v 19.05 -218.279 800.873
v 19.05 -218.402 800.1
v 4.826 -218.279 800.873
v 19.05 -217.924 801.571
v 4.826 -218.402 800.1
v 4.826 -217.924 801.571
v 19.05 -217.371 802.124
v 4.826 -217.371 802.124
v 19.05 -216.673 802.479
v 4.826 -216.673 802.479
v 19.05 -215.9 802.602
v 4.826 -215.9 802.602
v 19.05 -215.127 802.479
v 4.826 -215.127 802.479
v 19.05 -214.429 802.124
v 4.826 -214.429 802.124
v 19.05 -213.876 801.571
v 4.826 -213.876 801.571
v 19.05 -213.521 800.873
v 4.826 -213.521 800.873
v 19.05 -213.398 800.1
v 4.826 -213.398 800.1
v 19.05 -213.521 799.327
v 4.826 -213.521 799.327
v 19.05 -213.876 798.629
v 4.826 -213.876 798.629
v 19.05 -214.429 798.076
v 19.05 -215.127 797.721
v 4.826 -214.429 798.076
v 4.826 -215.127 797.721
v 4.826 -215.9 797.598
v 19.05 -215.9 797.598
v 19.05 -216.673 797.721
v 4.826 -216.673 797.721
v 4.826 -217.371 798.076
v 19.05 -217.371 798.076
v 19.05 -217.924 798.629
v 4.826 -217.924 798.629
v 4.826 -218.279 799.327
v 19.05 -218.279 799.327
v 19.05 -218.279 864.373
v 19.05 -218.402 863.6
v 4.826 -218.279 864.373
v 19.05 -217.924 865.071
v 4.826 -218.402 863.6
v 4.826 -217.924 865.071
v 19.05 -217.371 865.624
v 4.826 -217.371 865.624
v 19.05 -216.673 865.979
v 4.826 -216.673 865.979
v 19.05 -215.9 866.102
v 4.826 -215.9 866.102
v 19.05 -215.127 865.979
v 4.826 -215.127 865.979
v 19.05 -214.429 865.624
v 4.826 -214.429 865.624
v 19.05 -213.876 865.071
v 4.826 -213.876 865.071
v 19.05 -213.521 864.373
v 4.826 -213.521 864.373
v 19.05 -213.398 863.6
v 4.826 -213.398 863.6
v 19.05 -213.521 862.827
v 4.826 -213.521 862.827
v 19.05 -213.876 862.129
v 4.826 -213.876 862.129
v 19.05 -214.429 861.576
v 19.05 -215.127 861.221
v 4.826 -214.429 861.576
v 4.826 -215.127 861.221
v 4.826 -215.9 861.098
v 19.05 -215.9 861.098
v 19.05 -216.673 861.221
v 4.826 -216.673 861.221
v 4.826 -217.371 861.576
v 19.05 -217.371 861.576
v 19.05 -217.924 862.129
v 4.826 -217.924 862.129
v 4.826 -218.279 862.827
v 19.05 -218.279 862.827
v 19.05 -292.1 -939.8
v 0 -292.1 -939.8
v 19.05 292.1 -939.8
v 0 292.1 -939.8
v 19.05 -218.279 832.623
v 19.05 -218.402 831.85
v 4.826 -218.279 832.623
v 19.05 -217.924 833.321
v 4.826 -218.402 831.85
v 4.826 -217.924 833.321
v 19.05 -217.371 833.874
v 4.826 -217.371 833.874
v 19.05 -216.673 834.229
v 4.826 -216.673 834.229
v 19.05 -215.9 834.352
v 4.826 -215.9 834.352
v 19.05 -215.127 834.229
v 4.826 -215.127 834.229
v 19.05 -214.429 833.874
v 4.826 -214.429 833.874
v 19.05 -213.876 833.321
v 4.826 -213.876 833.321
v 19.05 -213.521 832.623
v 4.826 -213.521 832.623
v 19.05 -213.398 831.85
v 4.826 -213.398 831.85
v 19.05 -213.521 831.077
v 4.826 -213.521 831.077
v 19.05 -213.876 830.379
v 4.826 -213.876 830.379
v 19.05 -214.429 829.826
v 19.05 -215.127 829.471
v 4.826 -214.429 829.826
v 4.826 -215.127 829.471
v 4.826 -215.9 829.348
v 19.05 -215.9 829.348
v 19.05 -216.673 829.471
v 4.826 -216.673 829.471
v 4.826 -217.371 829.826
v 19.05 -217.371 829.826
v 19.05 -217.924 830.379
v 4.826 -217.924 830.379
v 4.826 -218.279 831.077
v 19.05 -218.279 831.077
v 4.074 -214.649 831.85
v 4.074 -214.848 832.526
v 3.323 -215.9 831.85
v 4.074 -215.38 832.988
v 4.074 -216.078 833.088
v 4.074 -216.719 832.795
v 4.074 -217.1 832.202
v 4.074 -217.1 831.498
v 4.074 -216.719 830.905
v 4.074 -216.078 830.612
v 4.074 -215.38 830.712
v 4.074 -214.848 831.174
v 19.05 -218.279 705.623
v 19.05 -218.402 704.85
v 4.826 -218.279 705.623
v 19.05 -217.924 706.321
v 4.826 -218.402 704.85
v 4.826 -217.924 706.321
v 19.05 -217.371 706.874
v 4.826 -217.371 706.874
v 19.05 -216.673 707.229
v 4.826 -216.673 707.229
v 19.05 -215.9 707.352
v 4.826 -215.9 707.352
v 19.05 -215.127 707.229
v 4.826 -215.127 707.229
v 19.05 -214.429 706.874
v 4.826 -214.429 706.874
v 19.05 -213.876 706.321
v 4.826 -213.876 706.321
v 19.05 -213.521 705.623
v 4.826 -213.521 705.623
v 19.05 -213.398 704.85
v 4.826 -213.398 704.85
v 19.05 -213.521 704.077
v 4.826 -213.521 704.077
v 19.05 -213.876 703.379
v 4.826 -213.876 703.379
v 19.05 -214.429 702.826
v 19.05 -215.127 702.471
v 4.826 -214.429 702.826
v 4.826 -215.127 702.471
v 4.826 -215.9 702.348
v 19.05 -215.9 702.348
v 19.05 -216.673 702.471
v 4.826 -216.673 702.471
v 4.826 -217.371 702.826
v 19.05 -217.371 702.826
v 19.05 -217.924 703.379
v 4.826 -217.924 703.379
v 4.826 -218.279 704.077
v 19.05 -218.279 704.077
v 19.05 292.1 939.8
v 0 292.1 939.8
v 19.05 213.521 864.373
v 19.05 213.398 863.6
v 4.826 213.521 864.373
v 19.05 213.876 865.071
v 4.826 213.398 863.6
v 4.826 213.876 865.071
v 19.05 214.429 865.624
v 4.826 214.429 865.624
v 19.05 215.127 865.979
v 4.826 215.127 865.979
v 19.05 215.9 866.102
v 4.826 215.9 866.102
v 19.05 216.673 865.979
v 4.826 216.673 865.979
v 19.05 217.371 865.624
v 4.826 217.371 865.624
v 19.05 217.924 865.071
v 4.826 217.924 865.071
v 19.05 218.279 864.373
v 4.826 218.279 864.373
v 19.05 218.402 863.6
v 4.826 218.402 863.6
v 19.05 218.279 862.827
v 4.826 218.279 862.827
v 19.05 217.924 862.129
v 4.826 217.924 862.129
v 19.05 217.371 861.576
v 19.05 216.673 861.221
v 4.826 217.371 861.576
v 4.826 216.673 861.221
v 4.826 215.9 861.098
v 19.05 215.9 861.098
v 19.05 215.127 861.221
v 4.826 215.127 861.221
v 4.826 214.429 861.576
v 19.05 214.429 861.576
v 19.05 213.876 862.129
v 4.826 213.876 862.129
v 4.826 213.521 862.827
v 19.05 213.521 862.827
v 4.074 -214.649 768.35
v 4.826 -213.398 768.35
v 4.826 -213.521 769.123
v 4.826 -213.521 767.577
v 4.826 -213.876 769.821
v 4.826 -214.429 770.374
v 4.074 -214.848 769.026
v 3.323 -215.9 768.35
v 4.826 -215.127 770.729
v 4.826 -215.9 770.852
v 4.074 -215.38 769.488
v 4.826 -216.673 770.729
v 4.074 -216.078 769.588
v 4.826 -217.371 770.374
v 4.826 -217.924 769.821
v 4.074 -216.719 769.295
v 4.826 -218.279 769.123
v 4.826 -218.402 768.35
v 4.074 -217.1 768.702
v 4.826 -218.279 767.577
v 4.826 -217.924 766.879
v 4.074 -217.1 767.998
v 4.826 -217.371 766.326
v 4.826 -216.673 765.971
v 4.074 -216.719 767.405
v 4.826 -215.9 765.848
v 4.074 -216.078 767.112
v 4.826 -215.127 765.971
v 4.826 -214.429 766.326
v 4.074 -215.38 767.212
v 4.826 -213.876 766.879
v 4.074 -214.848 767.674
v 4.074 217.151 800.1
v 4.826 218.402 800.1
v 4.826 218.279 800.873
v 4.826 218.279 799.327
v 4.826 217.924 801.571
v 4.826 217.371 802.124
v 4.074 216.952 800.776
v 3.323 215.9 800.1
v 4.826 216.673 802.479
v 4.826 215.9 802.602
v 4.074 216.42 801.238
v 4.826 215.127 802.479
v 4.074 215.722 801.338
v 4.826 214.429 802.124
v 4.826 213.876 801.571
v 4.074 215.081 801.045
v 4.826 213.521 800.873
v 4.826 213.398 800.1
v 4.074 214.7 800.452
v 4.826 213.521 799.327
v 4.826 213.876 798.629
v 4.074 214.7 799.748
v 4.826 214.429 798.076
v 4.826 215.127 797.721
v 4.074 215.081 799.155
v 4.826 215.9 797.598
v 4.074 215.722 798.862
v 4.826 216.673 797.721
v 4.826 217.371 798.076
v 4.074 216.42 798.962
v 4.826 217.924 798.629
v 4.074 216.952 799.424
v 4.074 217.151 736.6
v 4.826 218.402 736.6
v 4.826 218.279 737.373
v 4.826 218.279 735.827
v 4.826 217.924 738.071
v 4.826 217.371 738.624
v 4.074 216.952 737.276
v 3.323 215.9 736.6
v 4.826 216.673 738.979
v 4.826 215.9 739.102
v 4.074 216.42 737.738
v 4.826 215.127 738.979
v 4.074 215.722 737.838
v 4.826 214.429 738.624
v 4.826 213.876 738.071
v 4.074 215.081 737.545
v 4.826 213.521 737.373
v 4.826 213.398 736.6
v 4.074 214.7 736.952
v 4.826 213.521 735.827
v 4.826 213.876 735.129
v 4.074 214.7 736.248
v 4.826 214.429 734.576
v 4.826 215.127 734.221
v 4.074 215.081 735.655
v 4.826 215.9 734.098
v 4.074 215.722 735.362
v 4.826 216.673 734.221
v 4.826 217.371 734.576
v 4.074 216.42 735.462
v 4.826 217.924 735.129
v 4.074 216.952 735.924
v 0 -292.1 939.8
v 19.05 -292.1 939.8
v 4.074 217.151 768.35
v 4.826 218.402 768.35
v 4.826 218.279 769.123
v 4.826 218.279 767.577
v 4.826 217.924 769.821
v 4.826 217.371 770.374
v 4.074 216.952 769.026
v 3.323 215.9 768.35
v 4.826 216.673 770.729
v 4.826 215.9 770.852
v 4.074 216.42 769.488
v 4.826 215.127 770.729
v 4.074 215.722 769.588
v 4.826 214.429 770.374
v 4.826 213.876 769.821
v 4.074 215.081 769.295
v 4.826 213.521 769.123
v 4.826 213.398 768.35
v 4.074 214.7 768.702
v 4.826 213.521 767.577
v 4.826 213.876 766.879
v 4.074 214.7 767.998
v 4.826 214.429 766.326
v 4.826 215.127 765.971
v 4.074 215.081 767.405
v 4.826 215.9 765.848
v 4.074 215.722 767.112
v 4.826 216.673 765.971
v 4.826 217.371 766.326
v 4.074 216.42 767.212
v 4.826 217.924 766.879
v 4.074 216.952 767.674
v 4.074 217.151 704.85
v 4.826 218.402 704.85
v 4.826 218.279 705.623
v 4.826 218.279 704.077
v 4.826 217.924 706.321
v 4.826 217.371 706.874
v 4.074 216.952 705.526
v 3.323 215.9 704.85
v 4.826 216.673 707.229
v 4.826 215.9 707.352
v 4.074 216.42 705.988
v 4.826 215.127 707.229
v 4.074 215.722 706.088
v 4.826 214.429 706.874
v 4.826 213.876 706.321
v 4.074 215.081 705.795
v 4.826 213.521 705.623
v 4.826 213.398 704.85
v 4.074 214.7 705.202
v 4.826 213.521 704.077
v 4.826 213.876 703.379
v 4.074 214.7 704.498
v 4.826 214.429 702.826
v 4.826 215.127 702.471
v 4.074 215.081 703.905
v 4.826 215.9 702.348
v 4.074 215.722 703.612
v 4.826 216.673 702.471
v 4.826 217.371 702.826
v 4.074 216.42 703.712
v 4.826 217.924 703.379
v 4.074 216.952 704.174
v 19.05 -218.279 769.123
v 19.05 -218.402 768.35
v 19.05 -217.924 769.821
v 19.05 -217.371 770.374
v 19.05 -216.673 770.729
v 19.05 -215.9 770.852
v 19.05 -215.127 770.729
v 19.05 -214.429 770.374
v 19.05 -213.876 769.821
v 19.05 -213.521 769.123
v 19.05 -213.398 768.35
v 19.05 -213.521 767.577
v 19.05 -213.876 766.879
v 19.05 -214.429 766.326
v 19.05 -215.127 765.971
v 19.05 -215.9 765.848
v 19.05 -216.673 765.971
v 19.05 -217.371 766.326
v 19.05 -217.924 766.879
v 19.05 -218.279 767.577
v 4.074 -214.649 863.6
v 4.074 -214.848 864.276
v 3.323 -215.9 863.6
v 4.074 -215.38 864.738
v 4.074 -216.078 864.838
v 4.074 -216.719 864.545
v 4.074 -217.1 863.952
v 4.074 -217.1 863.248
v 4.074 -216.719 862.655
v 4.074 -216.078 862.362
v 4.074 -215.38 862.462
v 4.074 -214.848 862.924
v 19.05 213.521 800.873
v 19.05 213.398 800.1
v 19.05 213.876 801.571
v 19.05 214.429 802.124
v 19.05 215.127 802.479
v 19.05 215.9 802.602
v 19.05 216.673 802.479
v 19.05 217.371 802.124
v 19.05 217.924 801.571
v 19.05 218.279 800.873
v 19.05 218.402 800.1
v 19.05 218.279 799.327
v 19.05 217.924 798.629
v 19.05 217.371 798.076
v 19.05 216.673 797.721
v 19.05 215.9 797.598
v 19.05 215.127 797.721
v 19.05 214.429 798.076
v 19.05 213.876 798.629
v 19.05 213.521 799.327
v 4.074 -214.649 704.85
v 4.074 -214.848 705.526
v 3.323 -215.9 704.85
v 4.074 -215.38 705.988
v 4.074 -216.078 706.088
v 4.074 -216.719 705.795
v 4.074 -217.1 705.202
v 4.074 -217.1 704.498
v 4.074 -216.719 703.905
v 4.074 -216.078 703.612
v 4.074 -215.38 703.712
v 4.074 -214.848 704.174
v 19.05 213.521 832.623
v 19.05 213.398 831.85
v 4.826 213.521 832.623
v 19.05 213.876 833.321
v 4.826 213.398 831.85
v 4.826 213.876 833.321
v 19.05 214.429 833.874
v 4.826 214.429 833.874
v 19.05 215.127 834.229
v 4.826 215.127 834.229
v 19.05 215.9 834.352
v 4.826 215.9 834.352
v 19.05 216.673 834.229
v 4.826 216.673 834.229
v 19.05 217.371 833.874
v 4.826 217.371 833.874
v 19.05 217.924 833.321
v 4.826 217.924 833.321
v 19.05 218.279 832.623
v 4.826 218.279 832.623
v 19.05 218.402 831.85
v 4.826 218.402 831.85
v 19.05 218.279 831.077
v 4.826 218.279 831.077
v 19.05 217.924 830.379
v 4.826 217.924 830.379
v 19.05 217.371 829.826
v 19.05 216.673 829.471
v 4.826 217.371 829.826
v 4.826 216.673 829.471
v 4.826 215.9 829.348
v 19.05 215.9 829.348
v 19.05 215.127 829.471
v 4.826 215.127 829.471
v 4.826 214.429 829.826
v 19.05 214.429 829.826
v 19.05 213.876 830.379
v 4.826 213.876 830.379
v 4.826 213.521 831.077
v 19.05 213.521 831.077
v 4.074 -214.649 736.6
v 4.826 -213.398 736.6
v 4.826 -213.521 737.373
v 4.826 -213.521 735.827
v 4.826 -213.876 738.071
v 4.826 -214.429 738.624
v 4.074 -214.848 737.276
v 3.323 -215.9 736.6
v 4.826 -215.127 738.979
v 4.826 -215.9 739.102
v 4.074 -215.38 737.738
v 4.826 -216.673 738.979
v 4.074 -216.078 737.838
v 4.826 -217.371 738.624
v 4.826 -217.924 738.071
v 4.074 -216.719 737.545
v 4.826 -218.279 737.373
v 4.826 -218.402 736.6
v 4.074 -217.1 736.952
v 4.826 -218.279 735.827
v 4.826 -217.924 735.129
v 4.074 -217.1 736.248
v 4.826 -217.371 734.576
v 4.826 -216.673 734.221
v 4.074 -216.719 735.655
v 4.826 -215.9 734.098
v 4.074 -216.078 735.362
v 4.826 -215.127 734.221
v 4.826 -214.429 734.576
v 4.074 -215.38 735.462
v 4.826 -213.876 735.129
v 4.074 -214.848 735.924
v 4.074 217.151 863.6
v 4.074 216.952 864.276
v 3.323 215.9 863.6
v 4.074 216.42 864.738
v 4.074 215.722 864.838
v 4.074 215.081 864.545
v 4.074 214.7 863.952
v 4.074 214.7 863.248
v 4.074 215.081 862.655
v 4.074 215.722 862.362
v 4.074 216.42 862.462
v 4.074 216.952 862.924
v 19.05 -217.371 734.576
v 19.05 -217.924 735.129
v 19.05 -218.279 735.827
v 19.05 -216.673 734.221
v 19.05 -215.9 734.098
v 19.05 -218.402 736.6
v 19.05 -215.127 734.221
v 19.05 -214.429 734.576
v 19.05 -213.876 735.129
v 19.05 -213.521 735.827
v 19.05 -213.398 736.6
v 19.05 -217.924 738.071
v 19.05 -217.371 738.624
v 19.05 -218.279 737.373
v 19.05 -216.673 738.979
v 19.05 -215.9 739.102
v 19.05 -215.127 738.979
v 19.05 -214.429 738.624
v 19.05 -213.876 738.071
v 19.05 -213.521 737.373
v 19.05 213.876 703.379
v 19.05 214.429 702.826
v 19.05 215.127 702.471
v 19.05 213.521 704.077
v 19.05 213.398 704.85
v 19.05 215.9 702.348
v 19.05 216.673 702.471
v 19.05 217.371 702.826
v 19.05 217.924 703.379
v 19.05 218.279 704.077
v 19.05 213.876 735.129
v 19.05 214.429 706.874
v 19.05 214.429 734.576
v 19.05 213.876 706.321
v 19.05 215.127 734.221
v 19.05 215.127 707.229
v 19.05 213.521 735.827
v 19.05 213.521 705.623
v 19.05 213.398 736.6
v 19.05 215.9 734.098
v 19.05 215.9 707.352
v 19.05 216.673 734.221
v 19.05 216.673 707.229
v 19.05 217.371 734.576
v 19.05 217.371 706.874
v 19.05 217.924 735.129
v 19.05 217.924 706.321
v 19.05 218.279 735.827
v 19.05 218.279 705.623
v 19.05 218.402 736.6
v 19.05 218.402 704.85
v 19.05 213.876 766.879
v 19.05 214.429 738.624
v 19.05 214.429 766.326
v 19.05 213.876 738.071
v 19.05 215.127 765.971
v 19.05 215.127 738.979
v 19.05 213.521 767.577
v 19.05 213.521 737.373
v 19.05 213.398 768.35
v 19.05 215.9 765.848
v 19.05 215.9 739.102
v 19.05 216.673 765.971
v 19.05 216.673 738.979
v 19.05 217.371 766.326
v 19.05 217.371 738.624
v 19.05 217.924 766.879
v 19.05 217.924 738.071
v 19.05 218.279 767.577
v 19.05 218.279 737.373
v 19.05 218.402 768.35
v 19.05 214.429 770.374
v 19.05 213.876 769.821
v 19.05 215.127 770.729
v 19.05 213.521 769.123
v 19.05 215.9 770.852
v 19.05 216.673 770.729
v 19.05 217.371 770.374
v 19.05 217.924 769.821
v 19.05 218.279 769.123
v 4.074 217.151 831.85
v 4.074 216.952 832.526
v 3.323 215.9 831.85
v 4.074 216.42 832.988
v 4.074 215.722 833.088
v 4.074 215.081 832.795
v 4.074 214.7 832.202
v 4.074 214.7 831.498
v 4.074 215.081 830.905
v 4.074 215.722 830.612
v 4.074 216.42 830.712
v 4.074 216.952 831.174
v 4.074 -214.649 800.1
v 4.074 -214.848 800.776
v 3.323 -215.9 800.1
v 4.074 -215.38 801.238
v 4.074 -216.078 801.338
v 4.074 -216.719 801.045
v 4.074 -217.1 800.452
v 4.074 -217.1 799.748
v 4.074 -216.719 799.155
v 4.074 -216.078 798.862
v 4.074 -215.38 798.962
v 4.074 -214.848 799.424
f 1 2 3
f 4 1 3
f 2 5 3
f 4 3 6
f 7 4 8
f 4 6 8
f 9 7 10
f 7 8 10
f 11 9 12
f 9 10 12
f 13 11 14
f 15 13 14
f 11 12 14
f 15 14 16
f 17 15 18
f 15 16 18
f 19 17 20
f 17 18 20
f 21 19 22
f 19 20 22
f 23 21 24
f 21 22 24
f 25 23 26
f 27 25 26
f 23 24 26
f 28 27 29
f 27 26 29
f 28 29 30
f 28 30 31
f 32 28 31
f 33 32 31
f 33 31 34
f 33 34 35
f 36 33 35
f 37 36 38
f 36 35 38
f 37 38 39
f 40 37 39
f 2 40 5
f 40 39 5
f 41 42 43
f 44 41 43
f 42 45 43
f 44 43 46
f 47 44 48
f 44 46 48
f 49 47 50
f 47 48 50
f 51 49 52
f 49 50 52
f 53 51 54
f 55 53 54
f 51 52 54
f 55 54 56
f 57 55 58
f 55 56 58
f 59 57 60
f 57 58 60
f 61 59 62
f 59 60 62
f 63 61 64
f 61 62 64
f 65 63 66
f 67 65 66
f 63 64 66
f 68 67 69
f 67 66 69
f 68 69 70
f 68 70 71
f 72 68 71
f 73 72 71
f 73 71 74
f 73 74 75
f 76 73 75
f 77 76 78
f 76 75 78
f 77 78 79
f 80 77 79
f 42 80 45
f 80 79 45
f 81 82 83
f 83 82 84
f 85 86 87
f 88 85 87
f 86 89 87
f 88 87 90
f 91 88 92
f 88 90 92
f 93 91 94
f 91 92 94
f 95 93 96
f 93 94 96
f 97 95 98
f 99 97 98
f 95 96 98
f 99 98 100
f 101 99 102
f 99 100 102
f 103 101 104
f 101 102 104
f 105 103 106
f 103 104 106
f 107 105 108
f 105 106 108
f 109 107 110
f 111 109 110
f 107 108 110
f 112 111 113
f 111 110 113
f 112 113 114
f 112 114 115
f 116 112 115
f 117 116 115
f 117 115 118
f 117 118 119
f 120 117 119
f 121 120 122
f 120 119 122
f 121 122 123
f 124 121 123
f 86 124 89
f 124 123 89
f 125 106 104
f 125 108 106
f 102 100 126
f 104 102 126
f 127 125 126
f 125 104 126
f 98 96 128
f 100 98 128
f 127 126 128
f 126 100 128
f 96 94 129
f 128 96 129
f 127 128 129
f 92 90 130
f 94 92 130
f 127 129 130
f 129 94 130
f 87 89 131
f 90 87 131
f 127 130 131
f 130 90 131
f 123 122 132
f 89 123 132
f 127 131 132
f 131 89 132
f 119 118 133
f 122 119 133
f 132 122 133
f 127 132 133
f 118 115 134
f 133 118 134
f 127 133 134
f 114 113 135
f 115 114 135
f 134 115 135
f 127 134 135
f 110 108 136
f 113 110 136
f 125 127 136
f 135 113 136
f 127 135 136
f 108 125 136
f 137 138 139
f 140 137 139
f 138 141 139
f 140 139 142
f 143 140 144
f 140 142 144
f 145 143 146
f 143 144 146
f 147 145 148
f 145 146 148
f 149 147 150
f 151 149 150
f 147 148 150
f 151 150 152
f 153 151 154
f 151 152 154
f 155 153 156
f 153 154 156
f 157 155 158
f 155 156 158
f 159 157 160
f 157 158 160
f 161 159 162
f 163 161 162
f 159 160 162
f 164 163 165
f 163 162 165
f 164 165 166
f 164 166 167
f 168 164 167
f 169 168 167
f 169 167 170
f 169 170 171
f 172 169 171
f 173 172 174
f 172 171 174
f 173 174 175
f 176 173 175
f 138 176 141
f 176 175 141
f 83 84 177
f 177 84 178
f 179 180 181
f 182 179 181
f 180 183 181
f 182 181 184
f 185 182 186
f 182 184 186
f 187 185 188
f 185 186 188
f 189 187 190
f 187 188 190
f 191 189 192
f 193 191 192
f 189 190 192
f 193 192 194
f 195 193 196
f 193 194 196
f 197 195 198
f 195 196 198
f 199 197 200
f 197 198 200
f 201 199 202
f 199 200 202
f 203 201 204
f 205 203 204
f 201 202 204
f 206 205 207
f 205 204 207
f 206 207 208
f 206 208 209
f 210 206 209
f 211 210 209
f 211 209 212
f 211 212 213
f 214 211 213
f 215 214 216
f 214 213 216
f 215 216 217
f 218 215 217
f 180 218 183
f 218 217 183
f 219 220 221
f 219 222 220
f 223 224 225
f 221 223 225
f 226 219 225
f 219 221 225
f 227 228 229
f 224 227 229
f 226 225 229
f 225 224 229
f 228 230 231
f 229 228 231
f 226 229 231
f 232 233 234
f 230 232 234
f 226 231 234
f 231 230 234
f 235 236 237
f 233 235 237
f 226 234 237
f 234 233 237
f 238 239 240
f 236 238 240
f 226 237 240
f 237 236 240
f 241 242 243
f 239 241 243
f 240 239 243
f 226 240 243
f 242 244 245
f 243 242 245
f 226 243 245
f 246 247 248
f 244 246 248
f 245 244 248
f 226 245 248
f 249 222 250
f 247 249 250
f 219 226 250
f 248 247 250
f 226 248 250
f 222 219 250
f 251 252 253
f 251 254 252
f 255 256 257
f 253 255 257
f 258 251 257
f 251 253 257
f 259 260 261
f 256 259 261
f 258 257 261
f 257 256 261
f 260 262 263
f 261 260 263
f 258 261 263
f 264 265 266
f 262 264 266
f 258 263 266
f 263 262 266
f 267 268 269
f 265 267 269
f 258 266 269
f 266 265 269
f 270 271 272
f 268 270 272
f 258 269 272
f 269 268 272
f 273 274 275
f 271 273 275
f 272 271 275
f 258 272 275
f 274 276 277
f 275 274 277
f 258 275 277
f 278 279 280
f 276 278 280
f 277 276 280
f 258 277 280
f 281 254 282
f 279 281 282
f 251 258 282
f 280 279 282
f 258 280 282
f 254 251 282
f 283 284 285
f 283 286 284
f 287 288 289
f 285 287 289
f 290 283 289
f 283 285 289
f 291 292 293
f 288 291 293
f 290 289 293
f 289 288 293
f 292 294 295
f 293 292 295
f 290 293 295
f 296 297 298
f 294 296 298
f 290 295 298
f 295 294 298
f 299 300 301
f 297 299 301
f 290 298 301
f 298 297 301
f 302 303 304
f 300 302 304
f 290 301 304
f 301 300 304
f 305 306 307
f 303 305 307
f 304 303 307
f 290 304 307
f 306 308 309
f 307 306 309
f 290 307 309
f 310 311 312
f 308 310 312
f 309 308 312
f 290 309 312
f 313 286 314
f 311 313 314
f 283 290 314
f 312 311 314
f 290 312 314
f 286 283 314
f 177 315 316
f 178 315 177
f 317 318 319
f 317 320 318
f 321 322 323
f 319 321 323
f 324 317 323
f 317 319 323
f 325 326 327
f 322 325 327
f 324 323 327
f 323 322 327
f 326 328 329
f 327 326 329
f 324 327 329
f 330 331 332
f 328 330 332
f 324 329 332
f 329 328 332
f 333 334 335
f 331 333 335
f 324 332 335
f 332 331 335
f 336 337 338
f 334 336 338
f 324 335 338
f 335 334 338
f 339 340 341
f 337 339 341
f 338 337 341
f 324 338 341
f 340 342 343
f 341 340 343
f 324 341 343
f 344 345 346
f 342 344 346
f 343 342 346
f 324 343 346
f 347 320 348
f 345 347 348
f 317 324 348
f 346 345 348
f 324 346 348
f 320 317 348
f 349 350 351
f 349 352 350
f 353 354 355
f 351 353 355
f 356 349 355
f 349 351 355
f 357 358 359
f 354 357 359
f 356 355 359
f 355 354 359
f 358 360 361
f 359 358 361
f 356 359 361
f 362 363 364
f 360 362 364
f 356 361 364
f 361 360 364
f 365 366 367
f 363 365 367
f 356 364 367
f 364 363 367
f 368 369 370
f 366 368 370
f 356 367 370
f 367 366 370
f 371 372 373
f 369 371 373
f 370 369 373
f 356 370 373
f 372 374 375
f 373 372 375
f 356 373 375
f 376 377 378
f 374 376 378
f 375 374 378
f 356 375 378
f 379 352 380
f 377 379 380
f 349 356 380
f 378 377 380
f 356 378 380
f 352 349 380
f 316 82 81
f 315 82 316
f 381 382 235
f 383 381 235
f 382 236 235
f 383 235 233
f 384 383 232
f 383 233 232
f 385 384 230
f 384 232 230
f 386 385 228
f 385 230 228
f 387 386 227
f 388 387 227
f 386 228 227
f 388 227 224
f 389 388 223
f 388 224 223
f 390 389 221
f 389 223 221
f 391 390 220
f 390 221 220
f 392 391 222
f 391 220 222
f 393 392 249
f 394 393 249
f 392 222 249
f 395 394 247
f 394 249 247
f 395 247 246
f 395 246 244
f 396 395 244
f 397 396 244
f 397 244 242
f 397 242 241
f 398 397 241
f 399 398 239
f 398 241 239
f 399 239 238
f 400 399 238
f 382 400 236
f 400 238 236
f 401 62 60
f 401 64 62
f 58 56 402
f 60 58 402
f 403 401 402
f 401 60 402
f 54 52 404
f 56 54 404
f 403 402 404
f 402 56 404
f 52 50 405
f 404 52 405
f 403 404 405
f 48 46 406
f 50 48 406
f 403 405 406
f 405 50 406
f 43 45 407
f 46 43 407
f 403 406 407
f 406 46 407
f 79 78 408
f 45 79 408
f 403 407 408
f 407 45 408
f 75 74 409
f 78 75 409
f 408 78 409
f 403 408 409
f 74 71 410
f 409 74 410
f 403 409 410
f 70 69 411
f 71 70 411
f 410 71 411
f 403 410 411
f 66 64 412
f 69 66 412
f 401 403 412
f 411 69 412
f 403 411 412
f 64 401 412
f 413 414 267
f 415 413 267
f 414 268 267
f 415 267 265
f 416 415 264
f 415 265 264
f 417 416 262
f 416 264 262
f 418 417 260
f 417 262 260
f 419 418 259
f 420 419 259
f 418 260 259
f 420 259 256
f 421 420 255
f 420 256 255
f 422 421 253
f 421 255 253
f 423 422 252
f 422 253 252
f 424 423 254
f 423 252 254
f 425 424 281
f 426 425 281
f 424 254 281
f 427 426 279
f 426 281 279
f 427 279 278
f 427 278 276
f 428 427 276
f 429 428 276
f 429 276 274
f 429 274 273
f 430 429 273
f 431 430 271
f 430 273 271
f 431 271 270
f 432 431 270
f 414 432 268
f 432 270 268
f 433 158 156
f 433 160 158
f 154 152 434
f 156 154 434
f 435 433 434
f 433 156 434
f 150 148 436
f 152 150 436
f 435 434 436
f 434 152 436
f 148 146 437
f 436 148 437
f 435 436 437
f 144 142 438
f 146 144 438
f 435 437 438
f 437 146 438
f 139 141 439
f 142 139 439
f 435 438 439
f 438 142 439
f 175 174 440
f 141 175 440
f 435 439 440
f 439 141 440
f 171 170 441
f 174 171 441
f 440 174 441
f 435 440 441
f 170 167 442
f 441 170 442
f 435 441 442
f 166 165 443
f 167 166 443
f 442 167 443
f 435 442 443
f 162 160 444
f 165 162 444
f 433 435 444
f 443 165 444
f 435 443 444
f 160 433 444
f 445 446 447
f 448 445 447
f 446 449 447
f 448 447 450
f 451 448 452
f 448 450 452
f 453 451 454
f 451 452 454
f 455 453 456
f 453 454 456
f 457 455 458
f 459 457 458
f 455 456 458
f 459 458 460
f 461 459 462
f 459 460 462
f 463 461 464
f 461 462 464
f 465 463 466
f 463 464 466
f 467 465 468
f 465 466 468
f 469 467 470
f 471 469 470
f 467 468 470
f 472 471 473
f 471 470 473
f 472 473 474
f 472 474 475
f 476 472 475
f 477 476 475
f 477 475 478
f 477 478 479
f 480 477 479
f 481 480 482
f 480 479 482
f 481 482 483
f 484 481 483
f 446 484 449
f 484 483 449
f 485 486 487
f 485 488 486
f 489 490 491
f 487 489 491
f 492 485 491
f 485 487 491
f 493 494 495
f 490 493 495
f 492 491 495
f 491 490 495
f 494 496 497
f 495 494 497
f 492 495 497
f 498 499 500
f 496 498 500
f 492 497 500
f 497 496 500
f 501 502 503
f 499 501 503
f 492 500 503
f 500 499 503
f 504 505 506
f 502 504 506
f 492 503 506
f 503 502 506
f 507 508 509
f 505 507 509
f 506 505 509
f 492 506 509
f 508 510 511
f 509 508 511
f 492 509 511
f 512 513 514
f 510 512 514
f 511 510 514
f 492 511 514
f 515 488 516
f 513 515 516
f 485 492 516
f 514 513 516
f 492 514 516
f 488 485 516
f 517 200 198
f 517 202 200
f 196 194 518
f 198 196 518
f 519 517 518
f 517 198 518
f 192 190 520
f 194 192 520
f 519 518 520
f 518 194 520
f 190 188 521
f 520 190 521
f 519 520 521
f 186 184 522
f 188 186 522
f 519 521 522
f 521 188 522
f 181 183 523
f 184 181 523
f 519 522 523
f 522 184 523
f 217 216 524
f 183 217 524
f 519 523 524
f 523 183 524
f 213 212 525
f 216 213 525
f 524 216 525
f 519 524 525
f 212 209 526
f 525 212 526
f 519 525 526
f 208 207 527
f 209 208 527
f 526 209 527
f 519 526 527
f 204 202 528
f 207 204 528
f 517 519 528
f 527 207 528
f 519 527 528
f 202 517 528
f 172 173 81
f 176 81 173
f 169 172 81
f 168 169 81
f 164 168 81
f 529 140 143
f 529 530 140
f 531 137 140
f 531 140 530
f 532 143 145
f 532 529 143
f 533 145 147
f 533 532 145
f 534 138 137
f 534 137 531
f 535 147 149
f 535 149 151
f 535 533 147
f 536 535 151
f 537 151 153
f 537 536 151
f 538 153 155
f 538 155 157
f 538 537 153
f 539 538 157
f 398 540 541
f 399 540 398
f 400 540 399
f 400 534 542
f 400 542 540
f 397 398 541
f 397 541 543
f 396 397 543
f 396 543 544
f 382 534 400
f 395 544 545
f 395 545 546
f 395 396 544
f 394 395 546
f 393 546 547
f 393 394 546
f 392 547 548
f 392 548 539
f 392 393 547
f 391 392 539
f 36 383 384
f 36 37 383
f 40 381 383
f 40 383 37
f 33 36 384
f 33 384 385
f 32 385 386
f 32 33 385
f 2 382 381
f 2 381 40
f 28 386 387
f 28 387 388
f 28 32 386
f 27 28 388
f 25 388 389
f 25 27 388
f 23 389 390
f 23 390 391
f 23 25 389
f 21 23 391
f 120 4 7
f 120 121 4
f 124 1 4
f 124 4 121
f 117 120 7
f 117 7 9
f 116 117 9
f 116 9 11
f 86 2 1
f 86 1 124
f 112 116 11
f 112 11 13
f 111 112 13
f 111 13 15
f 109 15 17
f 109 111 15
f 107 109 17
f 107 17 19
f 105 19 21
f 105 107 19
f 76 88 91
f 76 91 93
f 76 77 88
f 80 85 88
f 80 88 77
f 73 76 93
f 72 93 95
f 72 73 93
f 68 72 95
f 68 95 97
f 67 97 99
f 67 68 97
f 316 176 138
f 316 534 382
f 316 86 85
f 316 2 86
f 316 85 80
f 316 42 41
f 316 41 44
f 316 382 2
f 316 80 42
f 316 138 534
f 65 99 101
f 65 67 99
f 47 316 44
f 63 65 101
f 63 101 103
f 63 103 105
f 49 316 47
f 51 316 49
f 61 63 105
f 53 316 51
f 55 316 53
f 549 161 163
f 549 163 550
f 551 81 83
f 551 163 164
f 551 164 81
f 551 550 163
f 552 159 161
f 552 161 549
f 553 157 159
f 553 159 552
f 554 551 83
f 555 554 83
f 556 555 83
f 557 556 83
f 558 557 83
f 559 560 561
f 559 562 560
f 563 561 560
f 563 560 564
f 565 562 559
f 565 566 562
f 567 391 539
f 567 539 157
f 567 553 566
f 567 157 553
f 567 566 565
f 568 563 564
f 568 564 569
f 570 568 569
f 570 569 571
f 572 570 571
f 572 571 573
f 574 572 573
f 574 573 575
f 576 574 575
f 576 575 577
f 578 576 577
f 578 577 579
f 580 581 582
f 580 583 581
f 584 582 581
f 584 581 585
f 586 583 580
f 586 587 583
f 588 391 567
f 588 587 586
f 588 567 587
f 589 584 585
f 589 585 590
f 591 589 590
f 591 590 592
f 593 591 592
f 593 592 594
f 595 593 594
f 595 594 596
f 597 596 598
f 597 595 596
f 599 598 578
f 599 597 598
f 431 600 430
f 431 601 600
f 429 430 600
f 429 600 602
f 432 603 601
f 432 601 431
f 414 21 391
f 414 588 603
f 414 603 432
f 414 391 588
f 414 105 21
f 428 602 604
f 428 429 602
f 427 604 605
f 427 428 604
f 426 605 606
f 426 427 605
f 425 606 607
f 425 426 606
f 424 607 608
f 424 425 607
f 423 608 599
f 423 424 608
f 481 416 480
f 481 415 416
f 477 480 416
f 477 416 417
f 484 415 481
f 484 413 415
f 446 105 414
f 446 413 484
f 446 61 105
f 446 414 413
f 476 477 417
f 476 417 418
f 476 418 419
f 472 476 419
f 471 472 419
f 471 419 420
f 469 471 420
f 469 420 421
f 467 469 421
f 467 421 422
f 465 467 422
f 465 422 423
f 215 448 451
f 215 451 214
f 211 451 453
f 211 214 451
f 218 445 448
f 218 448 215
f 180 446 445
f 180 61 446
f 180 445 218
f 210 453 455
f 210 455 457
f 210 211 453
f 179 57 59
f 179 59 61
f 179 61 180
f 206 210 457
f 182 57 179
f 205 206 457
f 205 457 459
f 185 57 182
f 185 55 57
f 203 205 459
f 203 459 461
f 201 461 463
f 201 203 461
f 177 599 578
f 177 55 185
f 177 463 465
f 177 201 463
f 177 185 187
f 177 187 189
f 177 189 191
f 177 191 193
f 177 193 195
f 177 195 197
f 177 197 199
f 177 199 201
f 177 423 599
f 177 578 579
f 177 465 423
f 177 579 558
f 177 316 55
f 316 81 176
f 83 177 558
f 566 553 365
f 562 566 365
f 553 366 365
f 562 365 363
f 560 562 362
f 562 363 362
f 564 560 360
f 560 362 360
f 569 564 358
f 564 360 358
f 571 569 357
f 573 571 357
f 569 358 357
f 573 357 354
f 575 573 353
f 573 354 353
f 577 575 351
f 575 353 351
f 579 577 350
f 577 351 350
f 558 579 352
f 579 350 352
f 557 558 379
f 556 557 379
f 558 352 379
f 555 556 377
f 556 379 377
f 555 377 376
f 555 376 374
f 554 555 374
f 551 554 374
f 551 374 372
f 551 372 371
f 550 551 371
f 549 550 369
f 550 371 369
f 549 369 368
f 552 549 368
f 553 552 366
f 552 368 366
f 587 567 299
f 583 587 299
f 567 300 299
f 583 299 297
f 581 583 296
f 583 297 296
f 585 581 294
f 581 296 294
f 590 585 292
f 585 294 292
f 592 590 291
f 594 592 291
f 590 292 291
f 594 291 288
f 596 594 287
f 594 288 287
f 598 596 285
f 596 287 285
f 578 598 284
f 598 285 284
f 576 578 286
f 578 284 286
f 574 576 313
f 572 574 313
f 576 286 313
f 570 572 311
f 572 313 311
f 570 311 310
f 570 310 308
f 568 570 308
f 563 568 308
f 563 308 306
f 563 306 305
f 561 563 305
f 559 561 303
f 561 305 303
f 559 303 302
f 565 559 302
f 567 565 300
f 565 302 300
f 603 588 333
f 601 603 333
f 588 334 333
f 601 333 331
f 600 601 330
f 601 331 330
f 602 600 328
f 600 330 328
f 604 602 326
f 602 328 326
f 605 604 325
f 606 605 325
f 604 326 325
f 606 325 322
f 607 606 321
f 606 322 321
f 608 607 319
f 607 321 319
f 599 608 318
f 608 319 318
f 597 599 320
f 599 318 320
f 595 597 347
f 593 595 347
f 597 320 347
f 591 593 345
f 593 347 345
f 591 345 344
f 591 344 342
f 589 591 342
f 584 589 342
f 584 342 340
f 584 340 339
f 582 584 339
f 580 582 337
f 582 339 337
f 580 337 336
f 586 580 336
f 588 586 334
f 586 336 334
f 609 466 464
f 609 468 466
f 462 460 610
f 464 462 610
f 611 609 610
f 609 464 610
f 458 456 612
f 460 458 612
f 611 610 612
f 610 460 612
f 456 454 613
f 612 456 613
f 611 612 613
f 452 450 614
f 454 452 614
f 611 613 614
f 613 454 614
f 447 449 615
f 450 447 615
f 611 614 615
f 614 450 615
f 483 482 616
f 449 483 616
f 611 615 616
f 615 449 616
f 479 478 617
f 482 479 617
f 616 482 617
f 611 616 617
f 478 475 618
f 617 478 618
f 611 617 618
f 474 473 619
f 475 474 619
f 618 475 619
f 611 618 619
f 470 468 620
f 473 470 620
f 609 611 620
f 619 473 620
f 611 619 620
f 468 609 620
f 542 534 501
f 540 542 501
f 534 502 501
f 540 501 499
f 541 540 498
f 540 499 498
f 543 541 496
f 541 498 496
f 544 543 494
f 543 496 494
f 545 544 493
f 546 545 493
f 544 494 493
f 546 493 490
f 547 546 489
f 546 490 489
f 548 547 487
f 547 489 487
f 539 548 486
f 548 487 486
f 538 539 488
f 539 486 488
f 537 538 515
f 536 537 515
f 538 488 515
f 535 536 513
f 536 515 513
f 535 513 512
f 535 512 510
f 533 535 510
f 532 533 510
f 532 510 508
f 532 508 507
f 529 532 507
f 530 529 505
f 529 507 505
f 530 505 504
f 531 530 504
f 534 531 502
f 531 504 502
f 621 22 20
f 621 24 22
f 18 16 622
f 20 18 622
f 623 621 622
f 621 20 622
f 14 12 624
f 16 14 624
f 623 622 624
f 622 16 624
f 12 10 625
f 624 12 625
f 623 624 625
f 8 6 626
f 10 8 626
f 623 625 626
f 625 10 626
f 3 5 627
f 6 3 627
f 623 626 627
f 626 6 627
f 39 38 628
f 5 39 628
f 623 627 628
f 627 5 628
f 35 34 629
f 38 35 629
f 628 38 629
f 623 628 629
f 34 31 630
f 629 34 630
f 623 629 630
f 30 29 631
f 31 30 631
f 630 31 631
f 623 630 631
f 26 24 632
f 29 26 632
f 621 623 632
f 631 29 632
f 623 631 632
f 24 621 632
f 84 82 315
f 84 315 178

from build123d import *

# Parameters (mm, degrees)
F0_W     = 584.2
F0_H     = 1879.6
F1_DEPTH = 19.05
F3_D     = 5.0038
F3_DEPTH = 14.224
F3_TIP   = 1.5032931827


# Not quite as in the source:
# - a feature names something its author has since deleted; it is built from what else it names


with BuildPart() as f1:
    # F0 (on Right) → F1 (new body)
    with BuildSketch(Plane.YZ):
        Rectangle(F0_W, F0_H)
    extrude(amount=F1_DEPTH)

    # F3
    with Locations(Plane.YZ.offset(19.05)):
        with Locations((-215.9, 863.6), (-215.9, 831.85), (-215.9, 800.1), (-215.9, 768.35), (-215.9, 736.6), (215.9, 863.6), (215.9, 831.85), (215.9, 800.1), (215.9, 768.35), (215.9, 736.6), (-215.9, 704.85), (215.9, 704.85)):
            Hole(F3_D / 2, depth=F3_DEPTH)
            with Locations((0, 0, -(F3_DEPTH + F3_TIP / 2))):  # 118° drill point
                Cone(0, F3_D / 2, F3_TIP, mode=Mode.SUBTRACT)


solid = f1.part
